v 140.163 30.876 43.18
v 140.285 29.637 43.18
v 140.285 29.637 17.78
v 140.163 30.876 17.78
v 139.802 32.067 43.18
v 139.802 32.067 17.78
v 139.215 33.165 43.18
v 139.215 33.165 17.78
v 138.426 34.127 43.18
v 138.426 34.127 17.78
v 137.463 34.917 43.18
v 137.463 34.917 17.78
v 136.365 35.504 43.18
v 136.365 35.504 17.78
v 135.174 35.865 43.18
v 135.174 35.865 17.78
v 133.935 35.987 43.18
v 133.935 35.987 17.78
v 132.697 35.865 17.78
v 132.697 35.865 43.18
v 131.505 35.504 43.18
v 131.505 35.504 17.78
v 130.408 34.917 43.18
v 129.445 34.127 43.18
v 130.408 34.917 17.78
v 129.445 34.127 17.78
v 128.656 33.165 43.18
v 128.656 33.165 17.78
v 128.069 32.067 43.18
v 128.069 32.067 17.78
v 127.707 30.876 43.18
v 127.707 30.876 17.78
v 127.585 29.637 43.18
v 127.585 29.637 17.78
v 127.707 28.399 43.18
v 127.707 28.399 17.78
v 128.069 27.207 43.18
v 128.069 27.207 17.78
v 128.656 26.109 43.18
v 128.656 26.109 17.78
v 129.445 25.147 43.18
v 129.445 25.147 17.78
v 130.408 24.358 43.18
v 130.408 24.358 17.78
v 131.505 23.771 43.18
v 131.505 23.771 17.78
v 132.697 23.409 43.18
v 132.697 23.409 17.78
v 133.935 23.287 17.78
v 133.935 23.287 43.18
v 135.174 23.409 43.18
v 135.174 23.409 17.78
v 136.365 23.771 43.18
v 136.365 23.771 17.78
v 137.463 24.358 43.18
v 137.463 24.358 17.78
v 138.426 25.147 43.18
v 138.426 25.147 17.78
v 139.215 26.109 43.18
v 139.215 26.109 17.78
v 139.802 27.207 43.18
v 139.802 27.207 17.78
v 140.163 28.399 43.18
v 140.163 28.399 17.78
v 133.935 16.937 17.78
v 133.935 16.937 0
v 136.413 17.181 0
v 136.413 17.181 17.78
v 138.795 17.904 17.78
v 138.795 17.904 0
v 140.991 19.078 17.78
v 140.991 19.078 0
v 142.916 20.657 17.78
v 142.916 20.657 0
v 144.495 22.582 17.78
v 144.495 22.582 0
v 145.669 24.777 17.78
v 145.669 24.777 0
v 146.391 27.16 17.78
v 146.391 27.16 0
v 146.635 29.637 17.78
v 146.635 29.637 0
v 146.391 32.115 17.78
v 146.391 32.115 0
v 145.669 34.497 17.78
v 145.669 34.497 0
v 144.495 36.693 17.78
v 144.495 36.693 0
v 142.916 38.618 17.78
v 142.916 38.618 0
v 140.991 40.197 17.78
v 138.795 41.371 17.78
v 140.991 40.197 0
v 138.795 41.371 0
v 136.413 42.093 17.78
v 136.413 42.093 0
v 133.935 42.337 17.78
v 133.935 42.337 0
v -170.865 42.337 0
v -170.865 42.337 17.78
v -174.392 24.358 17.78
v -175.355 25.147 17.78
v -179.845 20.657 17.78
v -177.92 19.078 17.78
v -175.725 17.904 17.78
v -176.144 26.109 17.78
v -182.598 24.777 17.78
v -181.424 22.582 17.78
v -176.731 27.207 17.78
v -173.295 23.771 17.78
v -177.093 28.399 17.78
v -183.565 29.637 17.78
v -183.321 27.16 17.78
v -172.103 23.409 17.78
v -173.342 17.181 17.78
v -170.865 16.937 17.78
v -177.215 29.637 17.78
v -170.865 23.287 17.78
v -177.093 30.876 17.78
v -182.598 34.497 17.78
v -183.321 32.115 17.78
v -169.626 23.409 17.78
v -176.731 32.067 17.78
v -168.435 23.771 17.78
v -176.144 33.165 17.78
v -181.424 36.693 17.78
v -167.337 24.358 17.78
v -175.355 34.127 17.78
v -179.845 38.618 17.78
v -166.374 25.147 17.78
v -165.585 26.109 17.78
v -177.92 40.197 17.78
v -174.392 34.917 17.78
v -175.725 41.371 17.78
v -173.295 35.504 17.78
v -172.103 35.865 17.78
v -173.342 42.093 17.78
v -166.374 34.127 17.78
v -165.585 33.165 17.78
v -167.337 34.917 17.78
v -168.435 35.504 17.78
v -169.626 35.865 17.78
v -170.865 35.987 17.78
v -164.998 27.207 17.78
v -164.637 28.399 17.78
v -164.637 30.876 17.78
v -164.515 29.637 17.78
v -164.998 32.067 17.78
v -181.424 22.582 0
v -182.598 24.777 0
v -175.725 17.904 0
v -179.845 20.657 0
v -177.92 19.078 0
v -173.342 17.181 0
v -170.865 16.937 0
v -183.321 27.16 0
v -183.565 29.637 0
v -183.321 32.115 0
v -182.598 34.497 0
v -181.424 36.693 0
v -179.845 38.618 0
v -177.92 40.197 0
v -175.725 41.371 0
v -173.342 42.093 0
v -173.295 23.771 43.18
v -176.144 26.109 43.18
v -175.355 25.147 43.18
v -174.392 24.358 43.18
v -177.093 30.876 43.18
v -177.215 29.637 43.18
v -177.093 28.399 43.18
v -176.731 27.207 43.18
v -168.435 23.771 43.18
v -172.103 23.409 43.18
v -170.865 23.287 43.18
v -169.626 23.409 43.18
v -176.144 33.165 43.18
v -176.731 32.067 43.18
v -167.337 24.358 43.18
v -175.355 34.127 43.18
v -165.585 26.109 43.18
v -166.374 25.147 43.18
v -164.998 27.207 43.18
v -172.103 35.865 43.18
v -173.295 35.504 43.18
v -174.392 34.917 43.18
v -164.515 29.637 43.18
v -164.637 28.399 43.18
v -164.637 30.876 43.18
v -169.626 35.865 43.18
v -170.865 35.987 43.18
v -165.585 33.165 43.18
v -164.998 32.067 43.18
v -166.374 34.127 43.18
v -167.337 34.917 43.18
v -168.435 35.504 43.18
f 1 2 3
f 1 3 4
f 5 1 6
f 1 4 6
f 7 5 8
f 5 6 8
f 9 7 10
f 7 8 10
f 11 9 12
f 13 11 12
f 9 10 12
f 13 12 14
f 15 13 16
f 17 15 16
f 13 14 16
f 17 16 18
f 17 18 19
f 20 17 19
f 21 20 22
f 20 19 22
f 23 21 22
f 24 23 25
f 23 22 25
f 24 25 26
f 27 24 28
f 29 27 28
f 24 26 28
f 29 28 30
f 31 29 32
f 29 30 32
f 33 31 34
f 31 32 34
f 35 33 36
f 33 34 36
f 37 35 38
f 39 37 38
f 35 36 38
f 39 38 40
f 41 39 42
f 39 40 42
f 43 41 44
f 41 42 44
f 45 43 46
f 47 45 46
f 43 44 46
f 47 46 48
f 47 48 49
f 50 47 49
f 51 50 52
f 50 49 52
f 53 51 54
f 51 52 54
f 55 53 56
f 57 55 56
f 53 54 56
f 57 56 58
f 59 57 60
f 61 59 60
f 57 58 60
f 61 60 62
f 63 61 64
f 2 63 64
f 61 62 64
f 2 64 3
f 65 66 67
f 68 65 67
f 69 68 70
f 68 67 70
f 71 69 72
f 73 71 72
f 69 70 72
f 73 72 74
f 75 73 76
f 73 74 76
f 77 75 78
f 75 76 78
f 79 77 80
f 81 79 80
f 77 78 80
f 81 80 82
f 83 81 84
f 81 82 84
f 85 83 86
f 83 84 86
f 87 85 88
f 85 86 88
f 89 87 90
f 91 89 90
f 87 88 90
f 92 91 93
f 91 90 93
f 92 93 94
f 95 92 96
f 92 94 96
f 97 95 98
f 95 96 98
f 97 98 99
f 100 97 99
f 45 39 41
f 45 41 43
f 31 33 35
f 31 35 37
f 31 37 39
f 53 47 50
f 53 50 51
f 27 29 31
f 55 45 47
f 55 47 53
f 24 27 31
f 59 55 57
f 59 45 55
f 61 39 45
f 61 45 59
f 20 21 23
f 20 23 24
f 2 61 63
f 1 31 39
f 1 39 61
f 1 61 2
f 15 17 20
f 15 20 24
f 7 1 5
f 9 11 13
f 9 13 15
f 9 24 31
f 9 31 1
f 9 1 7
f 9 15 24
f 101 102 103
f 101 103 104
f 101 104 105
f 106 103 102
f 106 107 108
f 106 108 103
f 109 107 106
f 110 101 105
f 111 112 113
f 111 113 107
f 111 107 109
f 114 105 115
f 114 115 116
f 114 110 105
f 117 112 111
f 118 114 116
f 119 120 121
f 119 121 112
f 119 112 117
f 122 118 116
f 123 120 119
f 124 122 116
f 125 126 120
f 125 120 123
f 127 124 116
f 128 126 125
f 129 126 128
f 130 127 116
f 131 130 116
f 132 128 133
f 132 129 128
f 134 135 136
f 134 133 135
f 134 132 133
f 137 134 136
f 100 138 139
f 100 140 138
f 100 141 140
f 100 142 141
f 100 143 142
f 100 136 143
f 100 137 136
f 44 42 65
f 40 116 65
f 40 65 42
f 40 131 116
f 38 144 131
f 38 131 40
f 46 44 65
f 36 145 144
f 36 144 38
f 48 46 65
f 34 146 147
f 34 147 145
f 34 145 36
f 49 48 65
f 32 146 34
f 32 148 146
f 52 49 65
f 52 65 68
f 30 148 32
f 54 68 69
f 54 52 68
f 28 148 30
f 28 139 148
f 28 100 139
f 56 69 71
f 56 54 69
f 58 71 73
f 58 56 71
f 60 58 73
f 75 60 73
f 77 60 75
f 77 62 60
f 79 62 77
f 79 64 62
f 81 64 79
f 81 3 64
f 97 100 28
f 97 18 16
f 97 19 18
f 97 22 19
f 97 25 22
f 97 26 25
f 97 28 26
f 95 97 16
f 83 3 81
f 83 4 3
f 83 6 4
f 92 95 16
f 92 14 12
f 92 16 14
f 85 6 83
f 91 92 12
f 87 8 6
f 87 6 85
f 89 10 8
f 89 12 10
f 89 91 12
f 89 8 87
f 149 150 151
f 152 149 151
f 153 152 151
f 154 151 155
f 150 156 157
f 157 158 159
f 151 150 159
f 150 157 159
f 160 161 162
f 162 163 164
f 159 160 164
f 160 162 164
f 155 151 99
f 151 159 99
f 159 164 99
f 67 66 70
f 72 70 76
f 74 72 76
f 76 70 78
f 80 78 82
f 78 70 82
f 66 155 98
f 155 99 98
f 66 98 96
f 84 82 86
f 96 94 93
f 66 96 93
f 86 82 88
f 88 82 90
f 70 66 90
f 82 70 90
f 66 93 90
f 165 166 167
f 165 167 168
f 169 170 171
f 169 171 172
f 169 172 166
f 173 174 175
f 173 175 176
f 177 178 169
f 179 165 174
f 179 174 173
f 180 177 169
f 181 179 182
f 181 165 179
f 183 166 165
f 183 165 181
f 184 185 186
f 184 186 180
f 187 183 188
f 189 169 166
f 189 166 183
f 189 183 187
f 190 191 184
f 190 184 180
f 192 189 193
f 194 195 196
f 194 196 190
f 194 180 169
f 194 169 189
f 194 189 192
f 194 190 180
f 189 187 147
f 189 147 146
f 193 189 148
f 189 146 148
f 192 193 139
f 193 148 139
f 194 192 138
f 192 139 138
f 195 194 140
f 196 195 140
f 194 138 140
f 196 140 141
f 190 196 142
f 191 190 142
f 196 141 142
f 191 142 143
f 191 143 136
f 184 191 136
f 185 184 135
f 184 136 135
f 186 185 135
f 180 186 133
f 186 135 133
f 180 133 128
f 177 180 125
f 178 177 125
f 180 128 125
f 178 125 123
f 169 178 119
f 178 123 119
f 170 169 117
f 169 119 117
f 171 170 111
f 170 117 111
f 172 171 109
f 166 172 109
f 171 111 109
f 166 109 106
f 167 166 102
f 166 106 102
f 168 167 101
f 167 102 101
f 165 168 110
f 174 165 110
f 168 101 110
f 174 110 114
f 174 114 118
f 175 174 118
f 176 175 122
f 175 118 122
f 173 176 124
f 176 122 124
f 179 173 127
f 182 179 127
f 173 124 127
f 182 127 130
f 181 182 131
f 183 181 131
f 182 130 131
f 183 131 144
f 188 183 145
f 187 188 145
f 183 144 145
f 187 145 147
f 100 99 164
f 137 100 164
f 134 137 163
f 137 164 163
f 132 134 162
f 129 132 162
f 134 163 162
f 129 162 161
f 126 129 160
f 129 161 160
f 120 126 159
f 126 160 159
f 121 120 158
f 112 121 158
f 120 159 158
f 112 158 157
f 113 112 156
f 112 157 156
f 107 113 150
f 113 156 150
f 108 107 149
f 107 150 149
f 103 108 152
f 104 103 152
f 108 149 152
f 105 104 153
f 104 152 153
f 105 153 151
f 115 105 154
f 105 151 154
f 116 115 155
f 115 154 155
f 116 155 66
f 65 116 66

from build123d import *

# Parameters (mm, degrees)
F1_DEPTH = 17.78
F2_R     = 6.35
F3_DEPTH = 25.4


with BuildPart() as f1:
    # F0 (on Top) → F1 (new body)
    with BuildSketch(Plane.XY):
        with BuildLine():
            Line((133.935379, 42.337351), (-170.864621, 42.337351))
            ThreePointArc((-170.864621, 42.337351), (-183.564621, 29.637351), (-170.864621, 16.937351))
            Line((-170.864621, 16.937351), (133.935379, 16.937351))
            ThreePointArc((133.935379, 16.937351), (146.635379, 29.637351), (133.935379, 42.337351))
        make_face()
    extrude(amount=F1_DEPTH)

    # F2 (on face) → F3 (join)
    with BuildSketch(Plane.XY.offset(17.78)):
        with Locations((133.935379, 29.637351)):
            Circle(F2_R)
        with Locations((-170.864621, 29.637351)):
            Circle(F2_R)
    extrude(amount=F3_DEPTH)


solid = f1.part
